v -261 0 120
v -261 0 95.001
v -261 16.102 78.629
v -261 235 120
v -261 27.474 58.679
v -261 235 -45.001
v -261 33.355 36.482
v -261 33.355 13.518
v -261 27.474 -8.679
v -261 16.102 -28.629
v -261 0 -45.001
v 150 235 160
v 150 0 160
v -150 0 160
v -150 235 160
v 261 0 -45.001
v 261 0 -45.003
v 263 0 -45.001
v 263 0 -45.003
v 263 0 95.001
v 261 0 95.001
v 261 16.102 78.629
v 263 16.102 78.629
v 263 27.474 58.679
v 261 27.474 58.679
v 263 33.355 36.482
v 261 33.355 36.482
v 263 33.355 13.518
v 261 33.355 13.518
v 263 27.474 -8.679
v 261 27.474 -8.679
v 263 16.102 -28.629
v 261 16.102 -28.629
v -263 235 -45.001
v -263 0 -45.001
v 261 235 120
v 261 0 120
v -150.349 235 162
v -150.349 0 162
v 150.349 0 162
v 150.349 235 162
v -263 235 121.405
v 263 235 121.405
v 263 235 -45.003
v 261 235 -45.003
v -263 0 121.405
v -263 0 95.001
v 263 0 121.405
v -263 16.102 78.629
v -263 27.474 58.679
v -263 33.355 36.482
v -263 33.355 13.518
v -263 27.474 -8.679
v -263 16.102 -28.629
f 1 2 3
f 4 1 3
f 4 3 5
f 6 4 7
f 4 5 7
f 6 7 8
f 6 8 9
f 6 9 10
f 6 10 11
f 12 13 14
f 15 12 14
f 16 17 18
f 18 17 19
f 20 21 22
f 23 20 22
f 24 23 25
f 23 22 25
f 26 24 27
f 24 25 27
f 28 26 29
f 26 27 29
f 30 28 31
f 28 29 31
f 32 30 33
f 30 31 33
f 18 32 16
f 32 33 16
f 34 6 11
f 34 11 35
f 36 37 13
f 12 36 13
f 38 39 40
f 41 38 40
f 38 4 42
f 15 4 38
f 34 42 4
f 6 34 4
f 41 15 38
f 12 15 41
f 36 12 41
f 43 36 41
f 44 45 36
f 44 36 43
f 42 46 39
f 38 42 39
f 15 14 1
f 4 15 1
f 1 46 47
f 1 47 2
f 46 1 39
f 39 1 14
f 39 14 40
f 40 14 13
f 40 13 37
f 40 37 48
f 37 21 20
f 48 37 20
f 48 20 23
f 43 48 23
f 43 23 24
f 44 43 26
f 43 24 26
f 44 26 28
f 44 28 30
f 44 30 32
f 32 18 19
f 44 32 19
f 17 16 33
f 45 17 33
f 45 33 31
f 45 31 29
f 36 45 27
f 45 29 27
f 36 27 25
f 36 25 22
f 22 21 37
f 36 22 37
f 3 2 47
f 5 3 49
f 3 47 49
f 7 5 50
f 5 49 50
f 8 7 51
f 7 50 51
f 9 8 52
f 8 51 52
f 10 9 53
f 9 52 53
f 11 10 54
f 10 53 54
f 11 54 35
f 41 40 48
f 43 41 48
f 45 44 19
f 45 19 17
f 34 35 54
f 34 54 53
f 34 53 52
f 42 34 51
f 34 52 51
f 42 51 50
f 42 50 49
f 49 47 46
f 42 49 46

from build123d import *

# Parameters (mm, degrees)
BOSS_EXTRUDE2_DEPTH = 234.9999999
CUT_EXTRUDE1_REACH  = 600.452
SKETCH3_R           = 88.9


with BuildPart() as part:
    # Sketch2 → Boss-Extrude2 (new body)
    with BuildSketch(Plane(origin=(0, 0, 0), x_dir=(1, 0, 0), z_dir=(0, 1, 0))):
        Polygon((-263.000000064, 45.001214275), (-263.000000064, -121.405176327), (-150.349364373, -162), (150.349364373, -162), (263.000000064, -121.405176327), (263.000000064, 45.003453118), (261, 45.003453118), (261, -120), (150, -160), (-150, -160), (-261, -120), (-261, 45.001214275), align=None)
    extrude(amount=BOSS_EXTRUDE2_DEPTH)

    # Cut-Extrude1: up to this face of the body (flat: up to its plane)
    cut_extrude1_end = Plane(part.part.faces().sort_by_distance((263.000000064, 117.49999995, 38.200861605))[0])
    # Sketch3 → Cut-Extrude1 (cut, up to the picked face)
    with BuildSketch(Plane.ZY.offset(263.000000064), mode=Mode.PRIVATE) as cut_extrude1_sk1:
        with Locations((24.999999937, -54.80000008)):
            Circle(SKETCH3_R)
    cut_extrude1_tool1 = split(extrude(cut_extrude1_sk1.sketch, amount=-CUT_EXTRUDE1_REACH, mode=Mode.PRIVATE), bisect_by=cut_extrude1_end, keep=Keep.BOTH, mode=Mode.PRIVATE)
    add(cut_extrude1_tool1.solids().sort_by(Axis((-263, -54.8, 25), (1, 0, 0)))[0], mode=Mode.SUBTRACT)


solid = part.part
